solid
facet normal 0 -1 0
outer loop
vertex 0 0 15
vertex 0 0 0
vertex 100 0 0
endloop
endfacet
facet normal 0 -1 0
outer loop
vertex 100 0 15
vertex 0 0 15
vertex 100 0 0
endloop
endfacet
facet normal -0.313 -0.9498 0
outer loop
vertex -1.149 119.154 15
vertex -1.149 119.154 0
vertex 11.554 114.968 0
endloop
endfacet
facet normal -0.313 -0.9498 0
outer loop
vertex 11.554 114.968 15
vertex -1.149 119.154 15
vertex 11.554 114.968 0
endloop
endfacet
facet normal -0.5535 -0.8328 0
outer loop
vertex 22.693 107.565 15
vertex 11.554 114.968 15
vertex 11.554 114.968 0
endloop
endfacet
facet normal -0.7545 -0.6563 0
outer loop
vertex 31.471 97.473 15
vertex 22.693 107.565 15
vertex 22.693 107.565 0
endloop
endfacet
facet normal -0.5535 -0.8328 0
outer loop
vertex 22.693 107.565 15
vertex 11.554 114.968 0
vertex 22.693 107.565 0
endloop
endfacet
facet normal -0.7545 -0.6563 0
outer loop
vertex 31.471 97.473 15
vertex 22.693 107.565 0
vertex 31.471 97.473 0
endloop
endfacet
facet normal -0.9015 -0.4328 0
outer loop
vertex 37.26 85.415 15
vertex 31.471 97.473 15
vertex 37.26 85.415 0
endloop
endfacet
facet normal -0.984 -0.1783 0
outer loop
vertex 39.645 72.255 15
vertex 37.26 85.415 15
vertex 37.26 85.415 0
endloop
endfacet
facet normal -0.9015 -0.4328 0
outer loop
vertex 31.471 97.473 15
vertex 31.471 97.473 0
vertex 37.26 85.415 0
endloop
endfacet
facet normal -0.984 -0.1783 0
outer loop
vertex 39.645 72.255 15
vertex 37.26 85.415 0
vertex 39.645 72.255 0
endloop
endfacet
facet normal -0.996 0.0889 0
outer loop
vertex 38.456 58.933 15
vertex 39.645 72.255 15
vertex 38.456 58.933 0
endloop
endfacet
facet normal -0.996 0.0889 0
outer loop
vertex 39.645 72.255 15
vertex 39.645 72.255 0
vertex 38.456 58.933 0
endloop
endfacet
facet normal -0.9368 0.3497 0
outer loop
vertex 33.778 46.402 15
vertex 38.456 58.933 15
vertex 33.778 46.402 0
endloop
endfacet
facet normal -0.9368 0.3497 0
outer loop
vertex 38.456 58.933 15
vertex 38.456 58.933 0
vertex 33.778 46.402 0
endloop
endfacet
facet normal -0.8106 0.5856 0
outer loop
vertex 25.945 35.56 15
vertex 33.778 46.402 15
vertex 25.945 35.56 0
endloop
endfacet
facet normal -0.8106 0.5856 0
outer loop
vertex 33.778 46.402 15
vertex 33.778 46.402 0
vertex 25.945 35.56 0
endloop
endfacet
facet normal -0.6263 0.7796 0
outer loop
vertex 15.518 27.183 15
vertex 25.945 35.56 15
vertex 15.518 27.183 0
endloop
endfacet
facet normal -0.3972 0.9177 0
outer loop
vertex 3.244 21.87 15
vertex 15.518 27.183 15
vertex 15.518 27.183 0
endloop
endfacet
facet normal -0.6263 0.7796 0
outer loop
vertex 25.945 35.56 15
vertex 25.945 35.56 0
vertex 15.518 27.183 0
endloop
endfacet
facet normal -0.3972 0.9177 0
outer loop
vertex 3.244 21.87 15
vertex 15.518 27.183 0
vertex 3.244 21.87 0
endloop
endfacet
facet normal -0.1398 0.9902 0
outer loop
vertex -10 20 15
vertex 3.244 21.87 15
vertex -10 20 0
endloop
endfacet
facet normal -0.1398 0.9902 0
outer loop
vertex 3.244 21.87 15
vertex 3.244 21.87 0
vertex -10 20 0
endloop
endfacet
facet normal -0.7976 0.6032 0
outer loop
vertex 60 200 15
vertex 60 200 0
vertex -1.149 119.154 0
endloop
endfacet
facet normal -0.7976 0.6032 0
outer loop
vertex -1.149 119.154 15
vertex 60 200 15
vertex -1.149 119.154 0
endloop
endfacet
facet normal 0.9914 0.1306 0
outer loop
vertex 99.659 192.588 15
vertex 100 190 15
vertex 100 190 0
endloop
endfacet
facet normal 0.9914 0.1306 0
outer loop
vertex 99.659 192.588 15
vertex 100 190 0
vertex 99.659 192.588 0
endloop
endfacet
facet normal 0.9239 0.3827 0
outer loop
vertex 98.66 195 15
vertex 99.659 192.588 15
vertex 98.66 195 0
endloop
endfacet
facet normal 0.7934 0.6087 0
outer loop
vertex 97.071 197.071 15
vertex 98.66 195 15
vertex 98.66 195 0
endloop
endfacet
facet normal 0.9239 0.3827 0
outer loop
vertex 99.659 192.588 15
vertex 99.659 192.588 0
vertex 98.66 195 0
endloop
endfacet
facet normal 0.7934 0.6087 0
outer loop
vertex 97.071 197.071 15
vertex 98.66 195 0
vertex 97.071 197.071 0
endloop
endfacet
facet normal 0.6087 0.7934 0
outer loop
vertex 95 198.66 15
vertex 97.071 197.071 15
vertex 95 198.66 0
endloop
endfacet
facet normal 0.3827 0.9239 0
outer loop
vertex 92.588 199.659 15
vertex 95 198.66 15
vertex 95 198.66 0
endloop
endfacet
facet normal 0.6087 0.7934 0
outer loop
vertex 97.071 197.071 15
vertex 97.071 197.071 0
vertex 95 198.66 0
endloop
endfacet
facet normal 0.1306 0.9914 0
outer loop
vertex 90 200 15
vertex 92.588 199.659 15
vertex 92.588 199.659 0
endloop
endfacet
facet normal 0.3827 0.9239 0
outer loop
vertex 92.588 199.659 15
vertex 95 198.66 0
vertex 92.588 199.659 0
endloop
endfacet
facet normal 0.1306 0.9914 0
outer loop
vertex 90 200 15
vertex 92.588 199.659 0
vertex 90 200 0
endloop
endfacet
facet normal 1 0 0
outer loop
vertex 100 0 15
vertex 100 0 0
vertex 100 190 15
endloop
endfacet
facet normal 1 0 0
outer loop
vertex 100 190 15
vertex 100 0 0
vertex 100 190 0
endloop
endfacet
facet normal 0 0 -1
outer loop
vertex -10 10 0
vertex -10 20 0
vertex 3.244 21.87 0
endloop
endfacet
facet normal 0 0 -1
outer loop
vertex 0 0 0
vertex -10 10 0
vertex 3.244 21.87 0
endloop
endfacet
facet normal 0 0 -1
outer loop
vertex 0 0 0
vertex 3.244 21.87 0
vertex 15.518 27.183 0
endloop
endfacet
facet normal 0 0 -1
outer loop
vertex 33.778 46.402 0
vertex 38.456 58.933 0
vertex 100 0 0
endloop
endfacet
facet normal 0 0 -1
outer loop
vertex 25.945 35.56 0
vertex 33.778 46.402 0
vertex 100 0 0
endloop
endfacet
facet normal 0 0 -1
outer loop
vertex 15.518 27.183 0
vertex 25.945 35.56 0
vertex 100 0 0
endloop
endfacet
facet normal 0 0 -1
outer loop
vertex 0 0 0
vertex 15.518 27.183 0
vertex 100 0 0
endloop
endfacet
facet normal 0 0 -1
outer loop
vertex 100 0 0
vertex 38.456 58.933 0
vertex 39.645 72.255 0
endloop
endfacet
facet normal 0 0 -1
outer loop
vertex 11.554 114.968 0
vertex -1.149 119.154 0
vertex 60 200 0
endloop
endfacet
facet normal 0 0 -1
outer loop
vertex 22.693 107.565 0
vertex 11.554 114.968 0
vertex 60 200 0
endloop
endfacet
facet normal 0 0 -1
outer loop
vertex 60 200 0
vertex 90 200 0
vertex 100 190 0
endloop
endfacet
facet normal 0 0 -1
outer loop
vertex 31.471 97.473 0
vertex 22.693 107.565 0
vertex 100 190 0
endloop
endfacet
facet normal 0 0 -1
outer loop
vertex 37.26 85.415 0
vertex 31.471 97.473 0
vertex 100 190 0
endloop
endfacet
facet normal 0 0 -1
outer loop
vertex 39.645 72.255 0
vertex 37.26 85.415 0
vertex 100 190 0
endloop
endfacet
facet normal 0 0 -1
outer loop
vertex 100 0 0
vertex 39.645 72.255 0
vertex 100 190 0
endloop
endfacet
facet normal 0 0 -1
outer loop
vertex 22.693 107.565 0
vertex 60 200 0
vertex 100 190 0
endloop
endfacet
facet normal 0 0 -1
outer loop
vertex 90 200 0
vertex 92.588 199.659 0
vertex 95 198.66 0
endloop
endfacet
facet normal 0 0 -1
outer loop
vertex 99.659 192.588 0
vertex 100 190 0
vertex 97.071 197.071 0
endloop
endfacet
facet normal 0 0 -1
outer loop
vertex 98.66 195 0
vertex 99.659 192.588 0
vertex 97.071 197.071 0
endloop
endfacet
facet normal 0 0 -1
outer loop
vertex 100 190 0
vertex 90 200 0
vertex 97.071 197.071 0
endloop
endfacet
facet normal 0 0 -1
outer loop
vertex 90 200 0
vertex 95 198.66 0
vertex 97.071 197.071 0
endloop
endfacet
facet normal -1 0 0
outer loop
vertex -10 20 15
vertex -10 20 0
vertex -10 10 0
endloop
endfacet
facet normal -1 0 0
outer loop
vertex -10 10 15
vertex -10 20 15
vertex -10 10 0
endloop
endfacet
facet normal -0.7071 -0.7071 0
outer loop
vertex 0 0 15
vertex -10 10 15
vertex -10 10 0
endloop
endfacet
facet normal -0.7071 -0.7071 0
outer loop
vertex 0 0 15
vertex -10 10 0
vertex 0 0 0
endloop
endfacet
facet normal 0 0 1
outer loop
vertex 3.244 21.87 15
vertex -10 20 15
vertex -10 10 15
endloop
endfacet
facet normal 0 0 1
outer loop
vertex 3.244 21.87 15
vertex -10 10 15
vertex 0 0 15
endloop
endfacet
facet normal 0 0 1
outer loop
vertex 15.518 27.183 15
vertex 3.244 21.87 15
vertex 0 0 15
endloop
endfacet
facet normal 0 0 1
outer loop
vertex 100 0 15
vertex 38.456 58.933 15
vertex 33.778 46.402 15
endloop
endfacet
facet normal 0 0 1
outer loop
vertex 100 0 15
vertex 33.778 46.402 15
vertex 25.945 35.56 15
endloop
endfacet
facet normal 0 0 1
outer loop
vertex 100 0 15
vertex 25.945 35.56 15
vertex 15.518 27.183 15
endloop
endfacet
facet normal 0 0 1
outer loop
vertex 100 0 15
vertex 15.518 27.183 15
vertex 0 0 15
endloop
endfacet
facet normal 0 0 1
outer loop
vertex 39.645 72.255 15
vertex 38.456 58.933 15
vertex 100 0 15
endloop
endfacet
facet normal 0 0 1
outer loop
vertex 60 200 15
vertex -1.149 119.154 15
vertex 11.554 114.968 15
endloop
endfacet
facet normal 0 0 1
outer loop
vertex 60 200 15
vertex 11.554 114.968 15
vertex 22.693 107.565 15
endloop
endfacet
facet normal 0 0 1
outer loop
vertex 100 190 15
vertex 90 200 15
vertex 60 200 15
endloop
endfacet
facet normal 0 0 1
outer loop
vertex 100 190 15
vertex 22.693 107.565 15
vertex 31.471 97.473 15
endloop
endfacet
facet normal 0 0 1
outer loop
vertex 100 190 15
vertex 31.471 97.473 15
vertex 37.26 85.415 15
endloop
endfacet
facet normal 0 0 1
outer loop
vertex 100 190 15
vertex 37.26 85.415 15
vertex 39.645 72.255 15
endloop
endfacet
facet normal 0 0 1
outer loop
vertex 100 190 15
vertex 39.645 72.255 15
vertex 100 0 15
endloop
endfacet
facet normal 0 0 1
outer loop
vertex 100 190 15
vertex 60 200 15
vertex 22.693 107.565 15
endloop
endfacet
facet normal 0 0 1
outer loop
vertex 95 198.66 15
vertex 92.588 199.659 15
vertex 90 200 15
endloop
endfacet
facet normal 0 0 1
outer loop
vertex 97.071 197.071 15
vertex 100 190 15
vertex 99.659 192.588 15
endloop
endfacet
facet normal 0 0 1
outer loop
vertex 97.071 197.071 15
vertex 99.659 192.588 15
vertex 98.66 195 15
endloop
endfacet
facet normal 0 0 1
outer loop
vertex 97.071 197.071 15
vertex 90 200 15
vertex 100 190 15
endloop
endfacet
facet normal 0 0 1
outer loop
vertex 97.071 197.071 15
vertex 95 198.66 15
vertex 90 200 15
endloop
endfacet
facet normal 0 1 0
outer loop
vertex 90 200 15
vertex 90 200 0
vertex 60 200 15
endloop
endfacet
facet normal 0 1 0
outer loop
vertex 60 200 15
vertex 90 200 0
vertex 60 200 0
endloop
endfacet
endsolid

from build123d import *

# Parameters (mm, degrees)
BOSS_EXTRUDE1_DEPTH = 15


with BuildPart() as part:
    # Sketch1 → Boss-Extrude1 (new body)
    with BuildSketch(Plane.XY):
        with BuildLine():
            Line((0, 0), (100, 0))
            Line((100, 0), (100, 190))
            ThreePointArc((100, 190), (97.071067812, 197.071067812), (90, 200))
            Line((90, 200), (60, 200))
            Line((60, 200), (-1.149354388, 119.153849333))
            ThreePointArc((-1.149354388, 119.153849333), (39.497953664, 65.553662986), (-10, 20))
            Line((-10, 20), (-10, 10))
            Line((-10, 10), (0, 0))
        make_face()
    extrude(amount=BOSS_EXTRUDE1_DEPTH)


solid = part.part
